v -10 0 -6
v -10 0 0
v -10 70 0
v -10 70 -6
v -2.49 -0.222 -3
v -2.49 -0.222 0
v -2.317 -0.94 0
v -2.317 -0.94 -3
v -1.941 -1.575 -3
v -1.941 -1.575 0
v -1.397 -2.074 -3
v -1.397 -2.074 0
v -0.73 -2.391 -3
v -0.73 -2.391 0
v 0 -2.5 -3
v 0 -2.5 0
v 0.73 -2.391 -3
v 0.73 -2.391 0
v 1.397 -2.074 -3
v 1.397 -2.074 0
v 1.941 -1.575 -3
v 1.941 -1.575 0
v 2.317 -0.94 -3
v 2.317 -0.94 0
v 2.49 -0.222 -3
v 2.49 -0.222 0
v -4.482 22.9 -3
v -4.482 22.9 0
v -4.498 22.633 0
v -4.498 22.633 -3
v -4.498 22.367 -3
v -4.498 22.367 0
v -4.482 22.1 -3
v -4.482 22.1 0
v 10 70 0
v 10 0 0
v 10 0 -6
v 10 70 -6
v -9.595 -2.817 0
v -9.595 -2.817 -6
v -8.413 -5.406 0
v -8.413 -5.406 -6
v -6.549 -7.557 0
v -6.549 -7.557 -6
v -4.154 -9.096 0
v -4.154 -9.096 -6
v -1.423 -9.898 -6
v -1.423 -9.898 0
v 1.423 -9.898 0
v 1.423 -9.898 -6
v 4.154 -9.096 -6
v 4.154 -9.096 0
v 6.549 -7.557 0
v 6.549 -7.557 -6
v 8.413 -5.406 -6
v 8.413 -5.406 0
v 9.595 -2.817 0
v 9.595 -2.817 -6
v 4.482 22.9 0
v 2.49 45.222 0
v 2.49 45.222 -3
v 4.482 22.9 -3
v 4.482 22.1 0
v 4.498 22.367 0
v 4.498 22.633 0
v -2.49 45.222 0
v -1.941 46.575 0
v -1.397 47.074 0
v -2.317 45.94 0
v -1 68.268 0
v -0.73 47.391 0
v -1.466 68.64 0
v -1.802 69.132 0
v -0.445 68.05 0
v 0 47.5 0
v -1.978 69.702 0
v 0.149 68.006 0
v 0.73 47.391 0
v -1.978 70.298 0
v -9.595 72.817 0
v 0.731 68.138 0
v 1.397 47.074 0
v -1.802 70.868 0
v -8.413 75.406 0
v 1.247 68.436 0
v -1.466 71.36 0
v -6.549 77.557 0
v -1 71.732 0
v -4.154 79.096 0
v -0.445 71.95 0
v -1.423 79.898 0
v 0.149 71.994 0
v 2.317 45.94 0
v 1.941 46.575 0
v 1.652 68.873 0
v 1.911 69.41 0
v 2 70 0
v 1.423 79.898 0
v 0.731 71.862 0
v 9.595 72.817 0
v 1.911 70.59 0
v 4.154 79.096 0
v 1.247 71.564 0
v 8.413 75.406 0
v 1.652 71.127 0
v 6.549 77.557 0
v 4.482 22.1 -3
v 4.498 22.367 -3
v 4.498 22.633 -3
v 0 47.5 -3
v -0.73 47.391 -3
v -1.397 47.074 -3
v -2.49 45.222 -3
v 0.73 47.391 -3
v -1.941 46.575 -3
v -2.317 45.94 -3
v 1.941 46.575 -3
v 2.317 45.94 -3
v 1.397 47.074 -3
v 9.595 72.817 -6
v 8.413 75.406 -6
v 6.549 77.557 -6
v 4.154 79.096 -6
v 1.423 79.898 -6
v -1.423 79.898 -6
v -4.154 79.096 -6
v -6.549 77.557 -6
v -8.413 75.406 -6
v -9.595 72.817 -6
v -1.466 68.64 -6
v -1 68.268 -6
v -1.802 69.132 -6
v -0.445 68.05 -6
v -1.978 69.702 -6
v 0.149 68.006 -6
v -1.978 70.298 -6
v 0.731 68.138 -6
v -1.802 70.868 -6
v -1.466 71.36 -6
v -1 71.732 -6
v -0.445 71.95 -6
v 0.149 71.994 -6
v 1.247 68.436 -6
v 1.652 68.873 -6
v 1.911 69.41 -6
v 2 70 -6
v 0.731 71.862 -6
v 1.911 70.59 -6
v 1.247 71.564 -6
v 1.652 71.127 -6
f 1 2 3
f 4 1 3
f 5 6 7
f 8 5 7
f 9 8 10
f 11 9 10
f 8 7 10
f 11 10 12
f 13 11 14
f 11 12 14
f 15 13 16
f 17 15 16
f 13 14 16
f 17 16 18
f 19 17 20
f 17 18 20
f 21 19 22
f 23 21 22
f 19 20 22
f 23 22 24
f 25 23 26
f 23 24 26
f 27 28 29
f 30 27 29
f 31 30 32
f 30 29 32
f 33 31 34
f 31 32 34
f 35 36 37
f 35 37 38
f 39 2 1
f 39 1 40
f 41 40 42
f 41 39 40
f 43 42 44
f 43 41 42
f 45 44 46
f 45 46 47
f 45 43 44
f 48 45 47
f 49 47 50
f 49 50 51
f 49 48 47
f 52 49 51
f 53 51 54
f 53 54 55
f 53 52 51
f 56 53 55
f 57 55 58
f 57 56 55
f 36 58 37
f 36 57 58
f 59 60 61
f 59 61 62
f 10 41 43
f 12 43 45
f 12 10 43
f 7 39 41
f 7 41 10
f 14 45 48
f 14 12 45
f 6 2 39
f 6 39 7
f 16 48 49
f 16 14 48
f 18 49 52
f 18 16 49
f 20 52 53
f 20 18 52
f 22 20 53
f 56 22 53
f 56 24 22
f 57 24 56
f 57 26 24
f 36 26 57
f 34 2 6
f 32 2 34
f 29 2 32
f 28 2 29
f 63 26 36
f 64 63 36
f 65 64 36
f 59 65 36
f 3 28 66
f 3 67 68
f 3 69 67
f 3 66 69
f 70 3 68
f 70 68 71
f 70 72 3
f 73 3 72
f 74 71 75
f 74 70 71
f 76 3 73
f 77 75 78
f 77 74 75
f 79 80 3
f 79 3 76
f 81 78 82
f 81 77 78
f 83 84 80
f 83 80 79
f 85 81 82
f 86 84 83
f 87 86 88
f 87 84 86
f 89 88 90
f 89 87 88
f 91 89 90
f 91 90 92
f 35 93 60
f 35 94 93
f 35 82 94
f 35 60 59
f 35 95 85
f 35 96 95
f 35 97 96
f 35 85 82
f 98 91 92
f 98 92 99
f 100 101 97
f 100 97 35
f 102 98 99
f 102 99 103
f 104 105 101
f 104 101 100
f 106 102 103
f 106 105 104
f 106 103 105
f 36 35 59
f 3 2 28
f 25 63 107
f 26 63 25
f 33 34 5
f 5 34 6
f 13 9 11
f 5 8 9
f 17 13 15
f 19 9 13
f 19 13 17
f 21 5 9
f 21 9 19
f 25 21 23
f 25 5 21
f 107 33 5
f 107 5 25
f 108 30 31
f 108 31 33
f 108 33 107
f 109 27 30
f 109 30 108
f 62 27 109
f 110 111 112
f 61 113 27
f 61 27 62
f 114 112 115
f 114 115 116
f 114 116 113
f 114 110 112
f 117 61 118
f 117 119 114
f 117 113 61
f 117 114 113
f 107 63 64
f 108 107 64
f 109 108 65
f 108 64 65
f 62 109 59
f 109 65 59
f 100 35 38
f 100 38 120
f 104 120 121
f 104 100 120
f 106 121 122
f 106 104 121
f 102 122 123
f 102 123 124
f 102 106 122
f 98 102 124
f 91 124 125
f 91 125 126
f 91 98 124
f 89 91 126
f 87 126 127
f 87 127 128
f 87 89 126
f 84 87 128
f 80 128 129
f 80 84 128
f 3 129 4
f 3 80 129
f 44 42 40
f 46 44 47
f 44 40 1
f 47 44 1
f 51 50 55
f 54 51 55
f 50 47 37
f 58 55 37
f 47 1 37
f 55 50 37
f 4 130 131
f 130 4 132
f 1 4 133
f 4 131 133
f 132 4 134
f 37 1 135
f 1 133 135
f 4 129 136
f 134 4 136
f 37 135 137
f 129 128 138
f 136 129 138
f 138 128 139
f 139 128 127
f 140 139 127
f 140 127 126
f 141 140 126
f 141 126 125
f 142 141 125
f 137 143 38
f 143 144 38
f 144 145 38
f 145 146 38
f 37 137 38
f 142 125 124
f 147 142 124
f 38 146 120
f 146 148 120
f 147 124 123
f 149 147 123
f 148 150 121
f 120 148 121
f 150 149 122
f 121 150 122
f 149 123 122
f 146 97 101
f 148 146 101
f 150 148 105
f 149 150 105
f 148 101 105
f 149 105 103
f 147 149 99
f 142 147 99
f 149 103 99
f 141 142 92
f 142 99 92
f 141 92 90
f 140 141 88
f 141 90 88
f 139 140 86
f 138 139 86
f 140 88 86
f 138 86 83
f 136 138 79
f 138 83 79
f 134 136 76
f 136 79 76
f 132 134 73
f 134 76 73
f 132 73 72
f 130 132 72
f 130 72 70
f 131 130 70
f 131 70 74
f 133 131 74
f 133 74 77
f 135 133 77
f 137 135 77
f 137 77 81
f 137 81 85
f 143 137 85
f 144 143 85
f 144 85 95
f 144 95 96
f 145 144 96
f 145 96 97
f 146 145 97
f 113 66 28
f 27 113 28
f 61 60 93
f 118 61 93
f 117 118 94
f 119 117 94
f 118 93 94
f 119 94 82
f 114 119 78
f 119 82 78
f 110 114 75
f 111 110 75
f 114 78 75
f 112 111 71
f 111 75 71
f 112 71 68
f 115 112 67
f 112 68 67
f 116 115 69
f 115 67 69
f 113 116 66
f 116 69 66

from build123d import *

# Parameters (mm, degrees)
PAD_DEPTH         = 3
PAD001_DEPTH      = 6
SKETCH002_R       = 2
POCKET_DEPTH      = 6.001
POCKET_DEPTH_BACK = -0.001


with BuildPart() as horn:
    # Sketch → Pad (new body)
    with BuildSketch(Plane.XY):
        with BuildLine():
            ThreePointArc((-2.490104, -0.222222), (0, -2.5), (2.490104, -0.222222))
            Line((4.482187, 22.1), (2.490104, -0.222222))
            ThreePointArc((4.482187, 22.1), (4.5, 22.5), (4.482187, 22.9))
            Line((2.490104, 45.222222), (4.482187, 22.9))
            ThreePointArc((2.490104, 45.222222), (0, 47.5), (-2.490104, 45.222222))
            Line((-2.490104, 45.222222), (-4.482187, 22.9))
            ThreePointArc((-4.482187, 22.9), (-4.5, 22.5), (-4.482187, 22.1))
            Line((-4.482187, 22.1), (-2.490104, -0.222222))
        make_face()
    extrude(amount=-PAD_DEPTH)


with BuildPart() as cut:
    # Sketch001 → Pad001 (new body)
    with BuildSketch(Plane.XY):
        with BuildLine():
            ThreePointArc((-10, 0), (0, -10), (10, 0))
            Line((10, 0), (10, 70))
            ThreePointArc((10, 70), (0, 80), (-10, 70))
            Line((-10, 0), (-10, 70))
        make_face()
    extrude(amount=-PAD001_DEPTH)

    # Sketch002 → Pocket (cut, two sides)
    with BuildSketch(Plane.XY) as pocket_sk:
        with Locations((0, 70)):
            Circle(SKETCH002_R)
    extrude(amount=-POCKET_DEPTH, mode=Mode.SUBTRACT)
    extrude(pocket_sk.sketch, amount=-POCKET_DEPTH_BACK, mode=Mode.SUBTRACT)

    # Cut: cut Horn
    add(horn.part, mode=Mode.SUBTRACT)


solid = cut.part
